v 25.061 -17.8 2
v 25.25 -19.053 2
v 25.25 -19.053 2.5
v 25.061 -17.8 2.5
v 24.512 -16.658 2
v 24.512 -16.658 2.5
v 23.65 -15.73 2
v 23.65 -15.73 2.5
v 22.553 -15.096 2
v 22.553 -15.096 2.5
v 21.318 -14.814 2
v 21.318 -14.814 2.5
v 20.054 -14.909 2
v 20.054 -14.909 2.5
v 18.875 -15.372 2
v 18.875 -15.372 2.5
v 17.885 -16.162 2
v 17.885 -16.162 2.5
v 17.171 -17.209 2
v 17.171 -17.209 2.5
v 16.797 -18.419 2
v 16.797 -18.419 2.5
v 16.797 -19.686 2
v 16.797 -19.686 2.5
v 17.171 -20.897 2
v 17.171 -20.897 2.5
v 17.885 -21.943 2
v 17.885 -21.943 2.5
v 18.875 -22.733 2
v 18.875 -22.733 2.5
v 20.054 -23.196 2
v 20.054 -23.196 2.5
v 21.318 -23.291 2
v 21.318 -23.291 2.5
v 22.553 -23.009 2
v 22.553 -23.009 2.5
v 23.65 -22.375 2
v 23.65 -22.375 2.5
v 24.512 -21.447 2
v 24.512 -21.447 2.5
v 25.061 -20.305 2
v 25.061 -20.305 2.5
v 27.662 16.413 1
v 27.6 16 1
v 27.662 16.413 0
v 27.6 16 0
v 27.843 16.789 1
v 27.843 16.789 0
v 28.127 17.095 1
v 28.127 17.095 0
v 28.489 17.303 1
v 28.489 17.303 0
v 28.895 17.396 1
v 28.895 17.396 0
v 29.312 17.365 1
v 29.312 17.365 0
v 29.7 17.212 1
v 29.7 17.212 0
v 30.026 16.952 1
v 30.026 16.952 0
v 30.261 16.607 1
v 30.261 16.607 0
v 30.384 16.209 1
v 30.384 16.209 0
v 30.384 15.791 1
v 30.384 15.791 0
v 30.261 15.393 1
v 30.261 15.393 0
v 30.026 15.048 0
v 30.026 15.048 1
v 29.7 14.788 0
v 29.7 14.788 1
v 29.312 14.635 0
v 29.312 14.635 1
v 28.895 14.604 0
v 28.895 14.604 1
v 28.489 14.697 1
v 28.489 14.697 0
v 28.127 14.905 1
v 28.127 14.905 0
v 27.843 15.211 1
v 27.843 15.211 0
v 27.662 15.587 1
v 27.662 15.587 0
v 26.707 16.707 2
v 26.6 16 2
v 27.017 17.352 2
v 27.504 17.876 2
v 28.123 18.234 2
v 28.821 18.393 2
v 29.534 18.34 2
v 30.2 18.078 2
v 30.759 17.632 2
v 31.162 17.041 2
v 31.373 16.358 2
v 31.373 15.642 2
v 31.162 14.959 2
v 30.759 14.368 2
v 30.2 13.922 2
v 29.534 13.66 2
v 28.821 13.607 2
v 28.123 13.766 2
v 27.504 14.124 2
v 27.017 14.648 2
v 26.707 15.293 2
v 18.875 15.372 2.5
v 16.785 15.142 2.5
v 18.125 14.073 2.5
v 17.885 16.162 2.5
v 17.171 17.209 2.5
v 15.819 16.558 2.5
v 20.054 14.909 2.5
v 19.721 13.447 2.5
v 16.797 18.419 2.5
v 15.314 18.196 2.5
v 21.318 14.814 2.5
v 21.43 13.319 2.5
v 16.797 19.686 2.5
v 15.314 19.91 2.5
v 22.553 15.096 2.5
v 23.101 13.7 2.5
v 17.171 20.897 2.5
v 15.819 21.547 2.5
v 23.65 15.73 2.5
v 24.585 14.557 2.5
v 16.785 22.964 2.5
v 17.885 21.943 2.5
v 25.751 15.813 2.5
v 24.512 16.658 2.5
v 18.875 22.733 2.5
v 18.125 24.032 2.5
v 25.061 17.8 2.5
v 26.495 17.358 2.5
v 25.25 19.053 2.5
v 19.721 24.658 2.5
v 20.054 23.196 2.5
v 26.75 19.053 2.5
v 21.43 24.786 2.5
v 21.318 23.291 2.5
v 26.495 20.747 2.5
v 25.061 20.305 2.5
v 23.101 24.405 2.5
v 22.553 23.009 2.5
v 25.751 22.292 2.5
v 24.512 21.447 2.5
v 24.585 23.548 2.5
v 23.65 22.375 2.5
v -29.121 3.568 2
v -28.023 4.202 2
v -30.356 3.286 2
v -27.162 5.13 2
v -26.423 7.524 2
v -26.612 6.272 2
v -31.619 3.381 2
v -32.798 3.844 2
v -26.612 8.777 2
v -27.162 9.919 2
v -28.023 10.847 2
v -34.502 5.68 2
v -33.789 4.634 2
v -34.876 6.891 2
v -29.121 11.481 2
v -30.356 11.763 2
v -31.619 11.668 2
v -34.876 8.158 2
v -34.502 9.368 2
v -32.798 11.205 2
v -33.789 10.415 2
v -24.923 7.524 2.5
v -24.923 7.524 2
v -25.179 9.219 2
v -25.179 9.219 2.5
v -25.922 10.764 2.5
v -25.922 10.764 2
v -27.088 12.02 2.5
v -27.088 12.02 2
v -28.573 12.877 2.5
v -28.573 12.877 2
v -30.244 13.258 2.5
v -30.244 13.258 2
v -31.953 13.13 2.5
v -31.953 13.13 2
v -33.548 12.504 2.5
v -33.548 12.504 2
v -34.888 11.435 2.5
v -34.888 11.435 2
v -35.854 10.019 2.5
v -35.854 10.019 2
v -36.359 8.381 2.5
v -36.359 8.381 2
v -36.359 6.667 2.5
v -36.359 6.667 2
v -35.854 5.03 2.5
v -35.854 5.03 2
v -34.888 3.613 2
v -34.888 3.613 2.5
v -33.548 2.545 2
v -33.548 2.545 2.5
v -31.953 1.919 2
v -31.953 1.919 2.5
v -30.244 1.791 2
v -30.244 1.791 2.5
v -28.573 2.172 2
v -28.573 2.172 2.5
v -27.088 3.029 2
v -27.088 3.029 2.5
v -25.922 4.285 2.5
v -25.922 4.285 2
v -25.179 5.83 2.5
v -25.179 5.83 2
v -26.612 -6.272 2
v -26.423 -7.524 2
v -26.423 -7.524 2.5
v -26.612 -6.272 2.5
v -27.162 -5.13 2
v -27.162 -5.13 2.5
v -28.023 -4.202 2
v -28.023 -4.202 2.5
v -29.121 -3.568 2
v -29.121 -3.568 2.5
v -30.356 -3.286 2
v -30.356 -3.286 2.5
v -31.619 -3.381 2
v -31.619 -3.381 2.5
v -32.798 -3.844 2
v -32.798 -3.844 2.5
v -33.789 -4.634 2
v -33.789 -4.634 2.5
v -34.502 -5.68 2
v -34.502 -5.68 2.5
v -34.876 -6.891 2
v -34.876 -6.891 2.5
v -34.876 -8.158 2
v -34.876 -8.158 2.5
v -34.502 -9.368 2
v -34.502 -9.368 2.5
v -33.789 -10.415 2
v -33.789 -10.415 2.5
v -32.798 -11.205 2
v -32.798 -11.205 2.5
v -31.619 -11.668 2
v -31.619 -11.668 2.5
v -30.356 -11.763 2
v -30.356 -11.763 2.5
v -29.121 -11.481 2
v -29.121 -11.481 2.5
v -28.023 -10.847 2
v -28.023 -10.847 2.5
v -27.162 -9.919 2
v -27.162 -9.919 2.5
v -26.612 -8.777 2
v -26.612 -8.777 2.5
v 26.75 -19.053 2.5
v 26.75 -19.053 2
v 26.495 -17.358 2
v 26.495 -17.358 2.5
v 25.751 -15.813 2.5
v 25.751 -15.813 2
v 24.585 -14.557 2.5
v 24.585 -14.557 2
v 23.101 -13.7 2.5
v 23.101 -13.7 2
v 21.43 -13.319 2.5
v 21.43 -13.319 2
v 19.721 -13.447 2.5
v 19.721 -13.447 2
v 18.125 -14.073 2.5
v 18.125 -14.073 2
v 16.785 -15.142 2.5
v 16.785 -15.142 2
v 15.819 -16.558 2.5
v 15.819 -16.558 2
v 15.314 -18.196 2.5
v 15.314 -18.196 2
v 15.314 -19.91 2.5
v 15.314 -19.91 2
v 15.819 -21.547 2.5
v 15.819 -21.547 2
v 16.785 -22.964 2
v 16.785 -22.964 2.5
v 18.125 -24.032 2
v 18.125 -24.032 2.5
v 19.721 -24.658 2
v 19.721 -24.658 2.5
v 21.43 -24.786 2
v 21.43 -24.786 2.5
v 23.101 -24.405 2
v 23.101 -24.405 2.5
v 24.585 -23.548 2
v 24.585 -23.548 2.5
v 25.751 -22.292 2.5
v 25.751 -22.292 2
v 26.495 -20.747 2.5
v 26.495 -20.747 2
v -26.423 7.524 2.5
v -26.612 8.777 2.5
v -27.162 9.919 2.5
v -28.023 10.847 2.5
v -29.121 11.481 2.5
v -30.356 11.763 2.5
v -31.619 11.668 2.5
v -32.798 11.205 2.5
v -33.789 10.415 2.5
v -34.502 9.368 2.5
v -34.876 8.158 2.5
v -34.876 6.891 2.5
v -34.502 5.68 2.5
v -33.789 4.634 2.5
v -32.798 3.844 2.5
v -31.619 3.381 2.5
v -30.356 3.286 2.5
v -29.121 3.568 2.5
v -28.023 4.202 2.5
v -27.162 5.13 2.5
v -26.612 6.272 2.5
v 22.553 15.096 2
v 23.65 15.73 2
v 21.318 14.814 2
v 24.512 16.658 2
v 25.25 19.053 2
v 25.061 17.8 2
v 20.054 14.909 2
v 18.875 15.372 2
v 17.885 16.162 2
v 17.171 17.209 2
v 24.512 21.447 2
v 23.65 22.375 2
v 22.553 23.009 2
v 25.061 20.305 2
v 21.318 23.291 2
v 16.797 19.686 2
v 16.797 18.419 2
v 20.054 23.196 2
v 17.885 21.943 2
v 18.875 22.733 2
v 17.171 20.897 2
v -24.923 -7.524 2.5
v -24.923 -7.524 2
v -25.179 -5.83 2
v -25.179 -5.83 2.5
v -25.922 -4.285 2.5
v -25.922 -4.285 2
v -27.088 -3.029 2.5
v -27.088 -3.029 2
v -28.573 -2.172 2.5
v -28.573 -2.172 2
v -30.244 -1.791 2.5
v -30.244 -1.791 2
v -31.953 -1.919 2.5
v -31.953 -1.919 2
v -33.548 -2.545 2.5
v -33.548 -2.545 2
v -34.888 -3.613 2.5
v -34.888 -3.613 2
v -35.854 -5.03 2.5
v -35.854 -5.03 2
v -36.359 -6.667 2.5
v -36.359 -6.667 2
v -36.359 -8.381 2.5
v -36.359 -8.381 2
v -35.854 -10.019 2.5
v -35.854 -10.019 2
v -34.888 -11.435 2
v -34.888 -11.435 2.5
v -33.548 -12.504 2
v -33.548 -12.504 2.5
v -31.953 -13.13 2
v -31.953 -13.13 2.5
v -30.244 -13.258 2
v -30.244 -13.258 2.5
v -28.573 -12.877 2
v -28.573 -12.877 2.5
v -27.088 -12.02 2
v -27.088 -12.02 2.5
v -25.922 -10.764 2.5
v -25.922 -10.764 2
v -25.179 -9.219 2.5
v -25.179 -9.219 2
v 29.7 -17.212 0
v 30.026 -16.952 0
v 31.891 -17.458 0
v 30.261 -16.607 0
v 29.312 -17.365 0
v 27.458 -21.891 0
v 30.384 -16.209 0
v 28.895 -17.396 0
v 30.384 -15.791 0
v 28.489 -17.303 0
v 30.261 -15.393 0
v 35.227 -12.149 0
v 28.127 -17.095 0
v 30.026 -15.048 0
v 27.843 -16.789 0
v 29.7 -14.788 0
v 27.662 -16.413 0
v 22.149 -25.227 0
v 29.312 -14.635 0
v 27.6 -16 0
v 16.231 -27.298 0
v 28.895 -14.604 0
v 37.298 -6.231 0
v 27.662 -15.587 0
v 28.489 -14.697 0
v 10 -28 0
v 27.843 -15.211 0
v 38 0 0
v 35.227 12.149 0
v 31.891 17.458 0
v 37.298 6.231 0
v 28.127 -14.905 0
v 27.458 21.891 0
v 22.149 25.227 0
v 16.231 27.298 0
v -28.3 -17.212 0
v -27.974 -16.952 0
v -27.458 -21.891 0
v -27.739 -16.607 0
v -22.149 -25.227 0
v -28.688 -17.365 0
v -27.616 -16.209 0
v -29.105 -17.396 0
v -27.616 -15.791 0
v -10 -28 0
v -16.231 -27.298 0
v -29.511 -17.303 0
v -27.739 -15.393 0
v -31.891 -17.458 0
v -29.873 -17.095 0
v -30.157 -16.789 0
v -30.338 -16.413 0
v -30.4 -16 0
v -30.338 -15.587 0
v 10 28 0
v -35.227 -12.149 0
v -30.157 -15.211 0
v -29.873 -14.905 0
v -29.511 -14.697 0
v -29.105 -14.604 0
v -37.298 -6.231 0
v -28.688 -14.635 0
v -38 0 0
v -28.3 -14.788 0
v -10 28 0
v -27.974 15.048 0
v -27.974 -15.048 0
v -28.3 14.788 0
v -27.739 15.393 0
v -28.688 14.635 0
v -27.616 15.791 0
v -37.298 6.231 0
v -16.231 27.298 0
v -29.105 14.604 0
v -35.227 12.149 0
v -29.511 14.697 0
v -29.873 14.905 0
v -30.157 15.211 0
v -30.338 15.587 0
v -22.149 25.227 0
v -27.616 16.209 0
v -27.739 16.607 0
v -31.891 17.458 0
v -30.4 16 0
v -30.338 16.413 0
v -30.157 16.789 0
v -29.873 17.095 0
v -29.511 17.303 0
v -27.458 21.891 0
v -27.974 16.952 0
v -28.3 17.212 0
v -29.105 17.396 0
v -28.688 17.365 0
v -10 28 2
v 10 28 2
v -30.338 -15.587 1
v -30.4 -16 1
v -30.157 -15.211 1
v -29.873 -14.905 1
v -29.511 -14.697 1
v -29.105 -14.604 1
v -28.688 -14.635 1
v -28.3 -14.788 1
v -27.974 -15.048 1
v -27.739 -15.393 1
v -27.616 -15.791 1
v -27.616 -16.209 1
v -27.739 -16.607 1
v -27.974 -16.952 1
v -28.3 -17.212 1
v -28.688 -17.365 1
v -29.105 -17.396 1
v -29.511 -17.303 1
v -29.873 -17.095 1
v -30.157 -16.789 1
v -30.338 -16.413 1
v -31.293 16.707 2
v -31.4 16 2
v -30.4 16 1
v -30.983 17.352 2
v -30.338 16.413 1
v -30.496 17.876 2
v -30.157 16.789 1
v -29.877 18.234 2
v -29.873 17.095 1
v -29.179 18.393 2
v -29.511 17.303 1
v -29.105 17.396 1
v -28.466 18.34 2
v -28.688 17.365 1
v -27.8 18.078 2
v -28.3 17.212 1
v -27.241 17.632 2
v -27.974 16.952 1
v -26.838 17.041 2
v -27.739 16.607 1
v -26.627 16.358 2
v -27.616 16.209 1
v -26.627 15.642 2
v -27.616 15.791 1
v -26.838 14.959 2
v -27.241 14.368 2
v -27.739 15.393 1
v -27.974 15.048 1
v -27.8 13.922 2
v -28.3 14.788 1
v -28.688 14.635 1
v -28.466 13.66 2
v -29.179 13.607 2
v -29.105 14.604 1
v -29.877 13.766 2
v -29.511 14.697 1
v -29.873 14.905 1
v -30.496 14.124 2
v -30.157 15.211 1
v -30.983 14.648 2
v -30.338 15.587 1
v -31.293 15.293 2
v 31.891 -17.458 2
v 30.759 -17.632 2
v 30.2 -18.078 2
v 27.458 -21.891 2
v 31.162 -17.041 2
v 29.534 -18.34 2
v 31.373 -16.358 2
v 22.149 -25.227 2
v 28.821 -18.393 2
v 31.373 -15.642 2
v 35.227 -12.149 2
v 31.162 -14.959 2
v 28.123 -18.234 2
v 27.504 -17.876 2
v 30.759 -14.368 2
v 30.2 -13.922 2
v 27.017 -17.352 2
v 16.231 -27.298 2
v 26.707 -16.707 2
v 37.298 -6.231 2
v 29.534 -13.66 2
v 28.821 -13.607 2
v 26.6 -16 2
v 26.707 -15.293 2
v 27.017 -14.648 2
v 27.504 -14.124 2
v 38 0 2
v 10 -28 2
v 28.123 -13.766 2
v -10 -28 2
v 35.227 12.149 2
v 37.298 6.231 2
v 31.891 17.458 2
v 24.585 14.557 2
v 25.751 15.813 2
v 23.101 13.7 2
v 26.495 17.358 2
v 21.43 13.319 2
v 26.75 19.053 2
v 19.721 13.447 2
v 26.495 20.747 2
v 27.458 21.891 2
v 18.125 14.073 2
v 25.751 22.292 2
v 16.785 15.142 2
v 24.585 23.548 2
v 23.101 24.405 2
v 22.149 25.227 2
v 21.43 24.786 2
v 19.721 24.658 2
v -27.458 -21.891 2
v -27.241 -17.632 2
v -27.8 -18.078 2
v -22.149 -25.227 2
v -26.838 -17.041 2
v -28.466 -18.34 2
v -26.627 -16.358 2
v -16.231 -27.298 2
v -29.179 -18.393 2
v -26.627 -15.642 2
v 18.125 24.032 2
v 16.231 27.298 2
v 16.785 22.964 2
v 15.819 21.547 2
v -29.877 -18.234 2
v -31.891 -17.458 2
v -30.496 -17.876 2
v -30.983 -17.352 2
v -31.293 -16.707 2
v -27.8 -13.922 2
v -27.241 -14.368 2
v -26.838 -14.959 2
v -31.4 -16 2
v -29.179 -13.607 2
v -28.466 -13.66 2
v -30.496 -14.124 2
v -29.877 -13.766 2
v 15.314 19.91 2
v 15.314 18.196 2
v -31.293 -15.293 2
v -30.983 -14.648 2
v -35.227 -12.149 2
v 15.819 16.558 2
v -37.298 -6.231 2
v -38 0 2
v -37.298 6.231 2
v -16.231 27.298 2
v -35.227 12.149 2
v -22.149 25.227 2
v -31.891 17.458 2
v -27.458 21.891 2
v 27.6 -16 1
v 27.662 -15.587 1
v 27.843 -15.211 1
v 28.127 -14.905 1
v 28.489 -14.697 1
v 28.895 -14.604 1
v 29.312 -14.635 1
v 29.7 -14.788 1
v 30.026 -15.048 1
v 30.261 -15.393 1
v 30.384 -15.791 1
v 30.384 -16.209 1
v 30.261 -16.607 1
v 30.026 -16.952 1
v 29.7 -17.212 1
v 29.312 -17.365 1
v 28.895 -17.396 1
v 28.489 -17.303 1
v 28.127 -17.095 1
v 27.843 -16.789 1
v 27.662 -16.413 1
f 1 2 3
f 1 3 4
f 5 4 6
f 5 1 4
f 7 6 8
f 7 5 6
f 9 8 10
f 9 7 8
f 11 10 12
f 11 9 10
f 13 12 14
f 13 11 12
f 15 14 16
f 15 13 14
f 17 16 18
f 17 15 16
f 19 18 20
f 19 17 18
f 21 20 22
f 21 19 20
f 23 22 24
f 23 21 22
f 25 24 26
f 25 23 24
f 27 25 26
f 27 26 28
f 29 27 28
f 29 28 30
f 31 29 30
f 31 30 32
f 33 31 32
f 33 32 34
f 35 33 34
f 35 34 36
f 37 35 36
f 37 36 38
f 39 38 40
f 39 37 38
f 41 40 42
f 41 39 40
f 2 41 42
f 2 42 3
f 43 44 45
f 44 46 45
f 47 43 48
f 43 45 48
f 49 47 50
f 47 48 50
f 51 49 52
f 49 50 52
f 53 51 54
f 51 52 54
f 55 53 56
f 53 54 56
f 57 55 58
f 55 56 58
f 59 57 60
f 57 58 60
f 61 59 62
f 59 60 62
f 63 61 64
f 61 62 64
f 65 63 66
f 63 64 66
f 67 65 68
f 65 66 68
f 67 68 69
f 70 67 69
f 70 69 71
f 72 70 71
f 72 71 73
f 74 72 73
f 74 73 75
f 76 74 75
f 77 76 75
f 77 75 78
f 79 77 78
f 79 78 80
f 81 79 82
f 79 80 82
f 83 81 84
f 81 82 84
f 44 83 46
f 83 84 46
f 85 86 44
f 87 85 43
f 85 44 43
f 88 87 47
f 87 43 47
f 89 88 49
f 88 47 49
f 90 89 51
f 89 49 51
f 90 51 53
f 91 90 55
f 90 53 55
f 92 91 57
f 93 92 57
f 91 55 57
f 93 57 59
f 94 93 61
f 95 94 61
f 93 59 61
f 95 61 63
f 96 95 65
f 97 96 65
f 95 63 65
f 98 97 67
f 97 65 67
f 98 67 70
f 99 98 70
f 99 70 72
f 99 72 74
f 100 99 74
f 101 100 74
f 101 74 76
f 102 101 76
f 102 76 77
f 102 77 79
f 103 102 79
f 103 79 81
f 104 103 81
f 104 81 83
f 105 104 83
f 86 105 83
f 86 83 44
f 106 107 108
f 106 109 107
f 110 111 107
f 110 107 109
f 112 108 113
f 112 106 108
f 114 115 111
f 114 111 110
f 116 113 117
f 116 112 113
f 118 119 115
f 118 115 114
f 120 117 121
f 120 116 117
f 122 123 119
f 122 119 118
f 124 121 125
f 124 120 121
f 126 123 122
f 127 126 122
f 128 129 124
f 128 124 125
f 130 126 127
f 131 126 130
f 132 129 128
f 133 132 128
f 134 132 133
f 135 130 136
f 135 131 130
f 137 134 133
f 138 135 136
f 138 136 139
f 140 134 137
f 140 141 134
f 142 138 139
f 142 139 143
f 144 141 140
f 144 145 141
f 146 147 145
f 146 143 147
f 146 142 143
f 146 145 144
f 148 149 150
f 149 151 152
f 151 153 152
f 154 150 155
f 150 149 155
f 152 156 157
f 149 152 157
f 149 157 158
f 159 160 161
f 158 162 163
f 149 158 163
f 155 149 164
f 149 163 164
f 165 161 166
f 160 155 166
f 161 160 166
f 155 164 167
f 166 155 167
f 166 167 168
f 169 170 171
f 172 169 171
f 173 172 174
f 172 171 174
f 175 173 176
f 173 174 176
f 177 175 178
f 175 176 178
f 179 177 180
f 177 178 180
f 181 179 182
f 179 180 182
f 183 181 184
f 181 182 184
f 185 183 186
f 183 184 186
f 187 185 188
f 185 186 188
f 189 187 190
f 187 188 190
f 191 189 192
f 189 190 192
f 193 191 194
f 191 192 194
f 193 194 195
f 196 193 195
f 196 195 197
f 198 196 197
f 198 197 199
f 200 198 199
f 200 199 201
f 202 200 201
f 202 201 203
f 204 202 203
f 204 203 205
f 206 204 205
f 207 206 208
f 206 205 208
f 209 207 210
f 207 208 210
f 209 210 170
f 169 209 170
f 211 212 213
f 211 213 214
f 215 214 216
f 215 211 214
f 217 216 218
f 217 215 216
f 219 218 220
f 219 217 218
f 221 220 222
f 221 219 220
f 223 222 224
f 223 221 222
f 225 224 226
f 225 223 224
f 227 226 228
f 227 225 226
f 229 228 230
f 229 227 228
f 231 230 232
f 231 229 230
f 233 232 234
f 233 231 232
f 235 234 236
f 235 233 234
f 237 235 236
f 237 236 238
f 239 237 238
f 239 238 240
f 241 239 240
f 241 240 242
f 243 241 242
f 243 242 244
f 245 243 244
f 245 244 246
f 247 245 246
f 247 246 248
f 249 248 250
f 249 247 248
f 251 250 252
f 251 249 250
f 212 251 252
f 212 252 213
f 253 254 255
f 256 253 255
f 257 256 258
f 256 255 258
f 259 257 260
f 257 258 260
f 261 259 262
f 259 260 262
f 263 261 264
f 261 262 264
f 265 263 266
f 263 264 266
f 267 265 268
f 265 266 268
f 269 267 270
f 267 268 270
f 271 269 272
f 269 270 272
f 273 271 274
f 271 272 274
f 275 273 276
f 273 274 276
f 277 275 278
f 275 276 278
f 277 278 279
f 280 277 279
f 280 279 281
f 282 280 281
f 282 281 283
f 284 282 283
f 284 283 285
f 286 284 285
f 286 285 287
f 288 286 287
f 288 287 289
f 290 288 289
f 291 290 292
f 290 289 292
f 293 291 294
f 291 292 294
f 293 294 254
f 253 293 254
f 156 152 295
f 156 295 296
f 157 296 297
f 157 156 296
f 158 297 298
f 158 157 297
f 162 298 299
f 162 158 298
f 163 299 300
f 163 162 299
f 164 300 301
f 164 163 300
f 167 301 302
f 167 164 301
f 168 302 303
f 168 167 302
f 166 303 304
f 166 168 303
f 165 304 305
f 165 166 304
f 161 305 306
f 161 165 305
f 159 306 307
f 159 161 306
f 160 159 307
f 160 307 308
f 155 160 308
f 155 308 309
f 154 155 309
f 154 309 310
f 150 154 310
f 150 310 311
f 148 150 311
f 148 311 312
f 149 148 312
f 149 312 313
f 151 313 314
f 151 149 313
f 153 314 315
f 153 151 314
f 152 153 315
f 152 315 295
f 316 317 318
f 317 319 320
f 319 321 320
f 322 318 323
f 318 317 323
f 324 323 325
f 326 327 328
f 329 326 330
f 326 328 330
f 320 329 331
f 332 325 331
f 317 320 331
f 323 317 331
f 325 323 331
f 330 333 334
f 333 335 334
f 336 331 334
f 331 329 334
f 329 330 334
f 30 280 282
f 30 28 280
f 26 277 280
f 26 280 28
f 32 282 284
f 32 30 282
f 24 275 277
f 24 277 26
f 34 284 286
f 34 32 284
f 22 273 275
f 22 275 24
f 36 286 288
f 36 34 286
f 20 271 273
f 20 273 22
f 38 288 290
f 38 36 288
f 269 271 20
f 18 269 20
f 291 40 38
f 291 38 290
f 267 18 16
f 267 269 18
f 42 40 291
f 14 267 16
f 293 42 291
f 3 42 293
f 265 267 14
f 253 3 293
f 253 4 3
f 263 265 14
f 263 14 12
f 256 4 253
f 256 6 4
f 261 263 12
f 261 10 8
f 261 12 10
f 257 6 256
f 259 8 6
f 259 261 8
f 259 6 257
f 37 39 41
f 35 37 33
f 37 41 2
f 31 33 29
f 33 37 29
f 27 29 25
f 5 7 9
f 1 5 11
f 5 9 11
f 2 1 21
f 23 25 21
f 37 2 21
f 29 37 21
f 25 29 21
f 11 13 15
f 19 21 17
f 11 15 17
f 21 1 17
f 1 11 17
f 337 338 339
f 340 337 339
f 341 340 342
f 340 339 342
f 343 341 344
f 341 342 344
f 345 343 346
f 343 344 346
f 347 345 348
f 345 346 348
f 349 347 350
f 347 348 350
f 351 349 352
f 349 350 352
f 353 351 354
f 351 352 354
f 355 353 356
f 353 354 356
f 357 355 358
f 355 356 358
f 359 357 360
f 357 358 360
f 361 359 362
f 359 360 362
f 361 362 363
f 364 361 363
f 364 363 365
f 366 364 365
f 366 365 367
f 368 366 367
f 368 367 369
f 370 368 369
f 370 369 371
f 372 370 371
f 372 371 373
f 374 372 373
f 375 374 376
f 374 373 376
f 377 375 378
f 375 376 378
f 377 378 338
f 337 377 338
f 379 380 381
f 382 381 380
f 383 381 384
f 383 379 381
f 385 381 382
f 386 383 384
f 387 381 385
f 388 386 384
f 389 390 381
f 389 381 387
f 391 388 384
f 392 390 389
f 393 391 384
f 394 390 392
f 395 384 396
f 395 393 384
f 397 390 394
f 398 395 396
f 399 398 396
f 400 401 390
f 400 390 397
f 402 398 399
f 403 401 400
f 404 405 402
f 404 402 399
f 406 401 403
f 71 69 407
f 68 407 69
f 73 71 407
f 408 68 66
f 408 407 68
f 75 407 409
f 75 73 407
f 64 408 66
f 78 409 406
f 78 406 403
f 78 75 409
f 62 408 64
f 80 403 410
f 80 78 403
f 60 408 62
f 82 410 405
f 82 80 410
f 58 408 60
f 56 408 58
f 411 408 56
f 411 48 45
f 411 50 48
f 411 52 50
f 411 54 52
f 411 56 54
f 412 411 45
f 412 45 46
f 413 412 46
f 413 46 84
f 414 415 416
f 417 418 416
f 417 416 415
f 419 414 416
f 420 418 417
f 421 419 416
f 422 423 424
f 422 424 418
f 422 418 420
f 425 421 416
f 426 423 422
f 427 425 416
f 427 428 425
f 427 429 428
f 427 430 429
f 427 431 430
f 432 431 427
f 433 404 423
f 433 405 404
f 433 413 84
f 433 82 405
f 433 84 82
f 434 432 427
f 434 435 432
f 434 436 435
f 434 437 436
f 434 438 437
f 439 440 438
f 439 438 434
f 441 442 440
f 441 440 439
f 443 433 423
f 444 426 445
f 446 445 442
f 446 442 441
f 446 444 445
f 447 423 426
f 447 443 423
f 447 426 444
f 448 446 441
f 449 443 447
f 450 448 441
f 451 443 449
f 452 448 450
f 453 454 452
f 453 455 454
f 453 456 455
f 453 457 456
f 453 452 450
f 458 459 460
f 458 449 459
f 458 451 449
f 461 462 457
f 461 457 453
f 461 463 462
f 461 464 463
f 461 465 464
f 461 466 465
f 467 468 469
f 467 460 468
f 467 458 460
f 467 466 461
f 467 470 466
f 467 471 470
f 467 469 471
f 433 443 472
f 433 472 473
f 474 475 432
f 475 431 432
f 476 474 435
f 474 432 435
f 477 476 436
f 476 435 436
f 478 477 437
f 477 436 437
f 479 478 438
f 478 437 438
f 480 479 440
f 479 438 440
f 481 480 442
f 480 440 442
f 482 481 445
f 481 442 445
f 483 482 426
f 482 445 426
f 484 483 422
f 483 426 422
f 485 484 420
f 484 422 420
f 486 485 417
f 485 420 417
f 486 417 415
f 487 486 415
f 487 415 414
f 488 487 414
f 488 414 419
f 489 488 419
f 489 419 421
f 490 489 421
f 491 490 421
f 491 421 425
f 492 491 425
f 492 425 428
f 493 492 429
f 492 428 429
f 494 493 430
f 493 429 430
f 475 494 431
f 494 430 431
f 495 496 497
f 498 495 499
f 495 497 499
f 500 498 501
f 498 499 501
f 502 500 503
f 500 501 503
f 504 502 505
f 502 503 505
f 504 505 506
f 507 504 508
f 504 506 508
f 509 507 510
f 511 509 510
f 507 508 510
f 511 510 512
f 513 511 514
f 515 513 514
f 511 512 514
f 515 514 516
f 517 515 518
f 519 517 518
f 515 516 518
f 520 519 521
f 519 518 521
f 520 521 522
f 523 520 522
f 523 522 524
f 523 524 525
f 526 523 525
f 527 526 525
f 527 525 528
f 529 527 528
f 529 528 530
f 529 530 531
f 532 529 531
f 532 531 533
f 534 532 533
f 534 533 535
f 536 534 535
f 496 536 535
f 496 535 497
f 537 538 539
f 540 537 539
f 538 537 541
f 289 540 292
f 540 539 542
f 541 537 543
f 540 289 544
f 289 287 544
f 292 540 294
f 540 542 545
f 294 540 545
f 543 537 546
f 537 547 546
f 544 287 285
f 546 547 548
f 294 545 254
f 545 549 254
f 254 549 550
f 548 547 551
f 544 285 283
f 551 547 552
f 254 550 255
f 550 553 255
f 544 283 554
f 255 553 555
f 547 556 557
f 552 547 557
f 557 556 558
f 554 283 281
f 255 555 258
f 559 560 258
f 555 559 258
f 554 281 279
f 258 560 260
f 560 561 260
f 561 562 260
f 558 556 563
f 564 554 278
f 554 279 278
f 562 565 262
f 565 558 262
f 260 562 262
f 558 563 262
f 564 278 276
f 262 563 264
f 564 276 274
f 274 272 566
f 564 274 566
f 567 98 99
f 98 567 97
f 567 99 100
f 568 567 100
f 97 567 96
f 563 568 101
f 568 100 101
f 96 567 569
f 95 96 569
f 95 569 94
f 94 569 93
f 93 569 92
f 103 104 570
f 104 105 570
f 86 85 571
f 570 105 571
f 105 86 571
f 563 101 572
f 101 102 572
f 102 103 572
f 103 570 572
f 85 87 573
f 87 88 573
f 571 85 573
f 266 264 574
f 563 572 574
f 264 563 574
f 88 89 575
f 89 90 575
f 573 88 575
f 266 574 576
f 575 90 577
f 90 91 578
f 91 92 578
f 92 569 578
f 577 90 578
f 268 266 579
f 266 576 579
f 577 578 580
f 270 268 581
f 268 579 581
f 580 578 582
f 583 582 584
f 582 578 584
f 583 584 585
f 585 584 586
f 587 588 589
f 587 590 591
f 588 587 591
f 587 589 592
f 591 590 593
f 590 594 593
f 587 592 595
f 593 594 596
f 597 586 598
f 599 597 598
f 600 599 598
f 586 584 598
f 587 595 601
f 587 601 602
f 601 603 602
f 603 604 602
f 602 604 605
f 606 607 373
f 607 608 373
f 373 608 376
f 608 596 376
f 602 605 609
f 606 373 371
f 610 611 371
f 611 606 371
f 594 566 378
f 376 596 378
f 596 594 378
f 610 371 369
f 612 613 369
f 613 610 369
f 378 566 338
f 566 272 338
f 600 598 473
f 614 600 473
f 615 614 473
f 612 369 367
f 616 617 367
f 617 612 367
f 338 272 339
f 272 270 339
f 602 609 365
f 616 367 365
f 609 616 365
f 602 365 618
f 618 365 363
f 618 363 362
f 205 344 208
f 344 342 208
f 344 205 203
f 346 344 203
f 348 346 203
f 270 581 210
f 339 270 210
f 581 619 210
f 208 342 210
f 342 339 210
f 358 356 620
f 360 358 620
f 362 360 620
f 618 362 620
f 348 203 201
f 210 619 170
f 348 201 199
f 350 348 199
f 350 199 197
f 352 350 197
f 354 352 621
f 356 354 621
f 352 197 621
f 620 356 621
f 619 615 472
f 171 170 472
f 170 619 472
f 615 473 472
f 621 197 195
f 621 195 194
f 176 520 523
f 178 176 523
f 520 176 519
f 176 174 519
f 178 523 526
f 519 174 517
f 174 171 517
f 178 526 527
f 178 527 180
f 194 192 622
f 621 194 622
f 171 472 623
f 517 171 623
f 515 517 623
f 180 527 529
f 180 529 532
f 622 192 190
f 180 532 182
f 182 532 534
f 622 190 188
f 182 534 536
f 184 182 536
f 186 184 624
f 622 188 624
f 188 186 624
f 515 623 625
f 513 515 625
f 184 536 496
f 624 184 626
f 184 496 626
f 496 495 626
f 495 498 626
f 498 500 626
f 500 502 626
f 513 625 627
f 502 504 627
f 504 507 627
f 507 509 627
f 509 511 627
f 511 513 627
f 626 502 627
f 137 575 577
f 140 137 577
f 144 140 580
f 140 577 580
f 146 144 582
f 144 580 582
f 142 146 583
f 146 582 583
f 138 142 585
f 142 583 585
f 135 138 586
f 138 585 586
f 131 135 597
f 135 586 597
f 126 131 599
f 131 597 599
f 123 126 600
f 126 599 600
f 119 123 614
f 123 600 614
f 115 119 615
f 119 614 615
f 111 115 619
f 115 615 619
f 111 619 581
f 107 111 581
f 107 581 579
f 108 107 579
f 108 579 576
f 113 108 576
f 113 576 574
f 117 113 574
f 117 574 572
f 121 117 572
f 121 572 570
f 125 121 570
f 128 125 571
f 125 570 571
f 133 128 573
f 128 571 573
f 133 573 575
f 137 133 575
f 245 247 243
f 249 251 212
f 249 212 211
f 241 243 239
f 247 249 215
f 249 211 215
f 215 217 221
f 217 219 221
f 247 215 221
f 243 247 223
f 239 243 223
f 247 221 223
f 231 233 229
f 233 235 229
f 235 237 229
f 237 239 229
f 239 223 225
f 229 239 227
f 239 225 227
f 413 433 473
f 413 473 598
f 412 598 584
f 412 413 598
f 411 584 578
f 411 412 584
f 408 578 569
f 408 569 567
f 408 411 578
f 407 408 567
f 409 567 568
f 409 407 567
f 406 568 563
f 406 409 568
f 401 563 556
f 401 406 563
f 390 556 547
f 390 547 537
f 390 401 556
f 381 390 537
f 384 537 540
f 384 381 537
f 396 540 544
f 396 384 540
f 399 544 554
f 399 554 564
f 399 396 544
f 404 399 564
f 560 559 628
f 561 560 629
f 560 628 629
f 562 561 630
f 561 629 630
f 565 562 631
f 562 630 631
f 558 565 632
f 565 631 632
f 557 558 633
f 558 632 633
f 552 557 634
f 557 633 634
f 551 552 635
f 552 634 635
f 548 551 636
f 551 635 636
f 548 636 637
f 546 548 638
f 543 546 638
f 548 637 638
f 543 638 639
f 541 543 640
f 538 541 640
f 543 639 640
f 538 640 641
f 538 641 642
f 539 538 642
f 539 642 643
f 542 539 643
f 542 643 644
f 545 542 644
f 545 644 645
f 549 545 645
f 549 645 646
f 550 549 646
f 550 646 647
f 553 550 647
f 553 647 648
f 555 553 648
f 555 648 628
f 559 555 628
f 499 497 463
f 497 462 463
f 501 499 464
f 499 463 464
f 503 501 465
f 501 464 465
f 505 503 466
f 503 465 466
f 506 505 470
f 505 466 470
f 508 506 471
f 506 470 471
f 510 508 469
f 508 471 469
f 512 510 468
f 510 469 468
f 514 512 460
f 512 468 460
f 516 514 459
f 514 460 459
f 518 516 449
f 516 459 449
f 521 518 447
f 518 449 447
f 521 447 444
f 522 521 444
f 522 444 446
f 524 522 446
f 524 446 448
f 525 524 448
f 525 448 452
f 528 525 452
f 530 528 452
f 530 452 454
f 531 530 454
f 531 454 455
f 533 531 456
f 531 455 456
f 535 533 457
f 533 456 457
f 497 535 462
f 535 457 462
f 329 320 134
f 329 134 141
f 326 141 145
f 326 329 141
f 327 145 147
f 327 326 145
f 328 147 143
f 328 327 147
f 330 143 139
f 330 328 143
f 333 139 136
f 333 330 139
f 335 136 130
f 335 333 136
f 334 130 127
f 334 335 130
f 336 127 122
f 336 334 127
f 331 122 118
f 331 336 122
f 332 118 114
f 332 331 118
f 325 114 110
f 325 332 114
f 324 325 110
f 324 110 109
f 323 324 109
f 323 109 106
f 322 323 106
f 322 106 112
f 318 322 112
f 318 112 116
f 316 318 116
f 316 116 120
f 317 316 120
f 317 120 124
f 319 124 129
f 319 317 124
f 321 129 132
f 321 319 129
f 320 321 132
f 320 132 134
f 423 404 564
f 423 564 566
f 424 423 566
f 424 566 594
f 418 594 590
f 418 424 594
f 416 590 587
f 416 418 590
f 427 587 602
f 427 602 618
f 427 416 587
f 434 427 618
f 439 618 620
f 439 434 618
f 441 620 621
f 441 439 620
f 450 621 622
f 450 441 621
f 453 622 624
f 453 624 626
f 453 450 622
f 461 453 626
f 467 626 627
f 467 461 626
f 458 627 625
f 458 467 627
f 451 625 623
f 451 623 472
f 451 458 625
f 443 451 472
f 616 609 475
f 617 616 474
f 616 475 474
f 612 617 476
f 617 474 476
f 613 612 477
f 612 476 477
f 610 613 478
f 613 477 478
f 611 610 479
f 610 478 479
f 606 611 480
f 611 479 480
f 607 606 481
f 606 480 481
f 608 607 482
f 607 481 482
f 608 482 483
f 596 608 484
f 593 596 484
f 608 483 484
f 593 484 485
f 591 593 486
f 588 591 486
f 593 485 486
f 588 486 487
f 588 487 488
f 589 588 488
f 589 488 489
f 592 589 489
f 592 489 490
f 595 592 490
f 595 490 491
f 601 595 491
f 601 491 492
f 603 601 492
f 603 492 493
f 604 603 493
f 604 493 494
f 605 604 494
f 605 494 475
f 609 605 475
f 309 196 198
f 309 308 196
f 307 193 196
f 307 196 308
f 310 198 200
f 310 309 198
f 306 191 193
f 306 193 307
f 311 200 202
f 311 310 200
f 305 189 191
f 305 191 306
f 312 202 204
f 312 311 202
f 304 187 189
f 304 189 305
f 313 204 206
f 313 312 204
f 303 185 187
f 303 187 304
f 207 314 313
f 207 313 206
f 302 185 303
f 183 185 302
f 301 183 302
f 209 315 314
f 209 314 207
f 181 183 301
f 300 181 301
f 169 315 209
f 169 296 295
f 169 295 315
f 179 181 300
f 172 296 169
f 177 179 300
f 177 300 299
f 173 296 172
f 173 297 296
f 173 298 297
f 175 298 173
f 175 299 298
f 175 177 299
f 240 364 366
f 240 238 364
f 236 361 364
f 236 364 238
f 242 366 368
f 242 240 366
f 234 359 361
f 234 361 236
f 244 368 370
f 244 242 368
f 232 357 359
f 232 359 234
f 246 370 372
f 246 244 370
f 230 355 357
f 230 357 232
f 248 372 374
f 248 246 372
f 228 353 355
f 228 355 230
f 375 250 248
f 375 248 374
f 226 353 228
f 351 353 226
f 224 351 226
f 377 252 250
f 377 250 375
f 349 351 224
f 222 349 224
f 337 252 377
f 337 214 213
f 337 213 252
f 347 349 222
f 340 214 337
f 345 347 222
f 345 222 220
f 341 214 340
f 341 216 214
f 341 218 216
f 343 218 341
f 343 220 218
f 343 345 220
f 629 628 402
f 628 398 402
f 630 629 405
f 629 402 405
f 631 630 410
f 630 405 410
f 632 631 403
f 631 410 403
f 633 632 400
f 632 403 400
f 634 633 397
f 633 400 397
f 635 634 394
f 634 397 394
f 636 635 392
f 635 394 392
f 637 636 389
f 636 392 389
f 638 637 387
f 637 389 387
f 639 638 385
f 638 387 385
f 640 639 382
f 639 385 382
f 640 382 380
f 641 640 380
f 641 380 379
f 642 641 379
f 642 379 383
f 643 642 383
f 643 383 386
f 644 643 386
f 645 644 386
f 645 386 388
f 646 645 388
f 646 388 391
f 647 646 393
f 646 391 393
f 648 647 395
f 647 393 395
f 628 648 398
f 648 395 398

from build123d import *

# Parameters (mm, degrees)
EXTRUDE_2_DEPTH           = 2
HOLE_WIZARD_0_D           = 2.8
HOLE_WIZARD_0_DEPTH       = 10.1
HOLE_WIZARD_0_CSINK_D     = 4.8
HOLE_WIZARD_0_CSINK_ANGLE = 90
HOLE_WIZARD_0_TIP         = 0.841204867
SKETCH_7_R                = 5.75
SKETCH_7_R_2              = 4.25
EXTRUDE_1_DEPTH           = 0.5


with BuildPart() as part:
    # 草图3 → 凸台-拉伸2 (new body)
    with BuildSketch(Plane.XY):
        with BuildLine():
            Line((10, -28), (-10, -28))
            ThreePointArc((-10, -28), (-38, 0), (-10, 28))
            Line((-10, 28), (10, 28))
            ThreePointArc((10, 28), (38, 0), (10, -28))
        make_face()
    extrude(amount=EXTRUDE_2_DEPTH)

    # 打孔尺寸(%根据十字)槽沉头自攻螺钉的类型0
    with Locations(Plane.XY.offset(2)):
        with Locations((-29, 16), (-29, -16), (29, 16), (29, -16)):
            CounterSinkHole(HOLE_WIZARD_0_D / 2, HOLE_WIZARD_0_CSINK_D / 2, depth=HOLE_WIZARD_0_DEPTH, counter_sink_angle=HOLE_WIZARD_0_CSINK_ANGLE)
            with Locations((0, 0, -(HOLE_WIZARD_0_DEPTH + HOLE_WIZARD_0_TIP / 2))):  # 118° drill point
                Cone(0, HOLE_WIZARD_0_D / 2, HOLE_WIZARD_0_TIP, mode=Mode.SUBTRACT)

    # 草图7 → 拉伸-薄壁1 (add)
    # profile 1 of 4: a face of its own
    with BuildSketch(Plane.XY.offset(2)):
        with Locations((-30.673237657, 7.524443153)):
            Circle(SKETCH_7_R)
        with Locations((-30.673237657, 7.524443153)):
            Circle(SKETCH_7_R_2, mode=Mode.SUBTRACT)
    # profile 2 of 4: a face of its own
    with BuildSketch(Plane.XY.offset(2)):
        with Locations((-30.673237657, -7.524443153)):
            Circle(SKETCH_7_R)
        with Locations((-30.673237657, -7.524443153)):
            Circle(SKETCH_7_R_2, mode=Mode.SUBTRACT)
    # profile 3 of 4: a face of its own
    with BuildSketch(Plane.XY.offset(2)):
        with Locations((21, -19.052558883)):
            Circle(SKETCH_7_R)
        with Locations((21, -19.052558883)):
            Circle(SKETCH_7_R_2, mode=Mode.SUBTRACT)
    # profile 4 of 4: a face of its own
    with BuildSketch(Plane.XY.offset(2)):
        with Locations((21, 19.052558883)):
            Circle(SKETCH_7_R)
        with Locations((21, 19.052558883)):
            Circle(SKETCH_7_R_2, mode=Mode.SUBTRACT)
    extrude(amount=EXTRUDE_1_DEPTH)


solid = part.part
